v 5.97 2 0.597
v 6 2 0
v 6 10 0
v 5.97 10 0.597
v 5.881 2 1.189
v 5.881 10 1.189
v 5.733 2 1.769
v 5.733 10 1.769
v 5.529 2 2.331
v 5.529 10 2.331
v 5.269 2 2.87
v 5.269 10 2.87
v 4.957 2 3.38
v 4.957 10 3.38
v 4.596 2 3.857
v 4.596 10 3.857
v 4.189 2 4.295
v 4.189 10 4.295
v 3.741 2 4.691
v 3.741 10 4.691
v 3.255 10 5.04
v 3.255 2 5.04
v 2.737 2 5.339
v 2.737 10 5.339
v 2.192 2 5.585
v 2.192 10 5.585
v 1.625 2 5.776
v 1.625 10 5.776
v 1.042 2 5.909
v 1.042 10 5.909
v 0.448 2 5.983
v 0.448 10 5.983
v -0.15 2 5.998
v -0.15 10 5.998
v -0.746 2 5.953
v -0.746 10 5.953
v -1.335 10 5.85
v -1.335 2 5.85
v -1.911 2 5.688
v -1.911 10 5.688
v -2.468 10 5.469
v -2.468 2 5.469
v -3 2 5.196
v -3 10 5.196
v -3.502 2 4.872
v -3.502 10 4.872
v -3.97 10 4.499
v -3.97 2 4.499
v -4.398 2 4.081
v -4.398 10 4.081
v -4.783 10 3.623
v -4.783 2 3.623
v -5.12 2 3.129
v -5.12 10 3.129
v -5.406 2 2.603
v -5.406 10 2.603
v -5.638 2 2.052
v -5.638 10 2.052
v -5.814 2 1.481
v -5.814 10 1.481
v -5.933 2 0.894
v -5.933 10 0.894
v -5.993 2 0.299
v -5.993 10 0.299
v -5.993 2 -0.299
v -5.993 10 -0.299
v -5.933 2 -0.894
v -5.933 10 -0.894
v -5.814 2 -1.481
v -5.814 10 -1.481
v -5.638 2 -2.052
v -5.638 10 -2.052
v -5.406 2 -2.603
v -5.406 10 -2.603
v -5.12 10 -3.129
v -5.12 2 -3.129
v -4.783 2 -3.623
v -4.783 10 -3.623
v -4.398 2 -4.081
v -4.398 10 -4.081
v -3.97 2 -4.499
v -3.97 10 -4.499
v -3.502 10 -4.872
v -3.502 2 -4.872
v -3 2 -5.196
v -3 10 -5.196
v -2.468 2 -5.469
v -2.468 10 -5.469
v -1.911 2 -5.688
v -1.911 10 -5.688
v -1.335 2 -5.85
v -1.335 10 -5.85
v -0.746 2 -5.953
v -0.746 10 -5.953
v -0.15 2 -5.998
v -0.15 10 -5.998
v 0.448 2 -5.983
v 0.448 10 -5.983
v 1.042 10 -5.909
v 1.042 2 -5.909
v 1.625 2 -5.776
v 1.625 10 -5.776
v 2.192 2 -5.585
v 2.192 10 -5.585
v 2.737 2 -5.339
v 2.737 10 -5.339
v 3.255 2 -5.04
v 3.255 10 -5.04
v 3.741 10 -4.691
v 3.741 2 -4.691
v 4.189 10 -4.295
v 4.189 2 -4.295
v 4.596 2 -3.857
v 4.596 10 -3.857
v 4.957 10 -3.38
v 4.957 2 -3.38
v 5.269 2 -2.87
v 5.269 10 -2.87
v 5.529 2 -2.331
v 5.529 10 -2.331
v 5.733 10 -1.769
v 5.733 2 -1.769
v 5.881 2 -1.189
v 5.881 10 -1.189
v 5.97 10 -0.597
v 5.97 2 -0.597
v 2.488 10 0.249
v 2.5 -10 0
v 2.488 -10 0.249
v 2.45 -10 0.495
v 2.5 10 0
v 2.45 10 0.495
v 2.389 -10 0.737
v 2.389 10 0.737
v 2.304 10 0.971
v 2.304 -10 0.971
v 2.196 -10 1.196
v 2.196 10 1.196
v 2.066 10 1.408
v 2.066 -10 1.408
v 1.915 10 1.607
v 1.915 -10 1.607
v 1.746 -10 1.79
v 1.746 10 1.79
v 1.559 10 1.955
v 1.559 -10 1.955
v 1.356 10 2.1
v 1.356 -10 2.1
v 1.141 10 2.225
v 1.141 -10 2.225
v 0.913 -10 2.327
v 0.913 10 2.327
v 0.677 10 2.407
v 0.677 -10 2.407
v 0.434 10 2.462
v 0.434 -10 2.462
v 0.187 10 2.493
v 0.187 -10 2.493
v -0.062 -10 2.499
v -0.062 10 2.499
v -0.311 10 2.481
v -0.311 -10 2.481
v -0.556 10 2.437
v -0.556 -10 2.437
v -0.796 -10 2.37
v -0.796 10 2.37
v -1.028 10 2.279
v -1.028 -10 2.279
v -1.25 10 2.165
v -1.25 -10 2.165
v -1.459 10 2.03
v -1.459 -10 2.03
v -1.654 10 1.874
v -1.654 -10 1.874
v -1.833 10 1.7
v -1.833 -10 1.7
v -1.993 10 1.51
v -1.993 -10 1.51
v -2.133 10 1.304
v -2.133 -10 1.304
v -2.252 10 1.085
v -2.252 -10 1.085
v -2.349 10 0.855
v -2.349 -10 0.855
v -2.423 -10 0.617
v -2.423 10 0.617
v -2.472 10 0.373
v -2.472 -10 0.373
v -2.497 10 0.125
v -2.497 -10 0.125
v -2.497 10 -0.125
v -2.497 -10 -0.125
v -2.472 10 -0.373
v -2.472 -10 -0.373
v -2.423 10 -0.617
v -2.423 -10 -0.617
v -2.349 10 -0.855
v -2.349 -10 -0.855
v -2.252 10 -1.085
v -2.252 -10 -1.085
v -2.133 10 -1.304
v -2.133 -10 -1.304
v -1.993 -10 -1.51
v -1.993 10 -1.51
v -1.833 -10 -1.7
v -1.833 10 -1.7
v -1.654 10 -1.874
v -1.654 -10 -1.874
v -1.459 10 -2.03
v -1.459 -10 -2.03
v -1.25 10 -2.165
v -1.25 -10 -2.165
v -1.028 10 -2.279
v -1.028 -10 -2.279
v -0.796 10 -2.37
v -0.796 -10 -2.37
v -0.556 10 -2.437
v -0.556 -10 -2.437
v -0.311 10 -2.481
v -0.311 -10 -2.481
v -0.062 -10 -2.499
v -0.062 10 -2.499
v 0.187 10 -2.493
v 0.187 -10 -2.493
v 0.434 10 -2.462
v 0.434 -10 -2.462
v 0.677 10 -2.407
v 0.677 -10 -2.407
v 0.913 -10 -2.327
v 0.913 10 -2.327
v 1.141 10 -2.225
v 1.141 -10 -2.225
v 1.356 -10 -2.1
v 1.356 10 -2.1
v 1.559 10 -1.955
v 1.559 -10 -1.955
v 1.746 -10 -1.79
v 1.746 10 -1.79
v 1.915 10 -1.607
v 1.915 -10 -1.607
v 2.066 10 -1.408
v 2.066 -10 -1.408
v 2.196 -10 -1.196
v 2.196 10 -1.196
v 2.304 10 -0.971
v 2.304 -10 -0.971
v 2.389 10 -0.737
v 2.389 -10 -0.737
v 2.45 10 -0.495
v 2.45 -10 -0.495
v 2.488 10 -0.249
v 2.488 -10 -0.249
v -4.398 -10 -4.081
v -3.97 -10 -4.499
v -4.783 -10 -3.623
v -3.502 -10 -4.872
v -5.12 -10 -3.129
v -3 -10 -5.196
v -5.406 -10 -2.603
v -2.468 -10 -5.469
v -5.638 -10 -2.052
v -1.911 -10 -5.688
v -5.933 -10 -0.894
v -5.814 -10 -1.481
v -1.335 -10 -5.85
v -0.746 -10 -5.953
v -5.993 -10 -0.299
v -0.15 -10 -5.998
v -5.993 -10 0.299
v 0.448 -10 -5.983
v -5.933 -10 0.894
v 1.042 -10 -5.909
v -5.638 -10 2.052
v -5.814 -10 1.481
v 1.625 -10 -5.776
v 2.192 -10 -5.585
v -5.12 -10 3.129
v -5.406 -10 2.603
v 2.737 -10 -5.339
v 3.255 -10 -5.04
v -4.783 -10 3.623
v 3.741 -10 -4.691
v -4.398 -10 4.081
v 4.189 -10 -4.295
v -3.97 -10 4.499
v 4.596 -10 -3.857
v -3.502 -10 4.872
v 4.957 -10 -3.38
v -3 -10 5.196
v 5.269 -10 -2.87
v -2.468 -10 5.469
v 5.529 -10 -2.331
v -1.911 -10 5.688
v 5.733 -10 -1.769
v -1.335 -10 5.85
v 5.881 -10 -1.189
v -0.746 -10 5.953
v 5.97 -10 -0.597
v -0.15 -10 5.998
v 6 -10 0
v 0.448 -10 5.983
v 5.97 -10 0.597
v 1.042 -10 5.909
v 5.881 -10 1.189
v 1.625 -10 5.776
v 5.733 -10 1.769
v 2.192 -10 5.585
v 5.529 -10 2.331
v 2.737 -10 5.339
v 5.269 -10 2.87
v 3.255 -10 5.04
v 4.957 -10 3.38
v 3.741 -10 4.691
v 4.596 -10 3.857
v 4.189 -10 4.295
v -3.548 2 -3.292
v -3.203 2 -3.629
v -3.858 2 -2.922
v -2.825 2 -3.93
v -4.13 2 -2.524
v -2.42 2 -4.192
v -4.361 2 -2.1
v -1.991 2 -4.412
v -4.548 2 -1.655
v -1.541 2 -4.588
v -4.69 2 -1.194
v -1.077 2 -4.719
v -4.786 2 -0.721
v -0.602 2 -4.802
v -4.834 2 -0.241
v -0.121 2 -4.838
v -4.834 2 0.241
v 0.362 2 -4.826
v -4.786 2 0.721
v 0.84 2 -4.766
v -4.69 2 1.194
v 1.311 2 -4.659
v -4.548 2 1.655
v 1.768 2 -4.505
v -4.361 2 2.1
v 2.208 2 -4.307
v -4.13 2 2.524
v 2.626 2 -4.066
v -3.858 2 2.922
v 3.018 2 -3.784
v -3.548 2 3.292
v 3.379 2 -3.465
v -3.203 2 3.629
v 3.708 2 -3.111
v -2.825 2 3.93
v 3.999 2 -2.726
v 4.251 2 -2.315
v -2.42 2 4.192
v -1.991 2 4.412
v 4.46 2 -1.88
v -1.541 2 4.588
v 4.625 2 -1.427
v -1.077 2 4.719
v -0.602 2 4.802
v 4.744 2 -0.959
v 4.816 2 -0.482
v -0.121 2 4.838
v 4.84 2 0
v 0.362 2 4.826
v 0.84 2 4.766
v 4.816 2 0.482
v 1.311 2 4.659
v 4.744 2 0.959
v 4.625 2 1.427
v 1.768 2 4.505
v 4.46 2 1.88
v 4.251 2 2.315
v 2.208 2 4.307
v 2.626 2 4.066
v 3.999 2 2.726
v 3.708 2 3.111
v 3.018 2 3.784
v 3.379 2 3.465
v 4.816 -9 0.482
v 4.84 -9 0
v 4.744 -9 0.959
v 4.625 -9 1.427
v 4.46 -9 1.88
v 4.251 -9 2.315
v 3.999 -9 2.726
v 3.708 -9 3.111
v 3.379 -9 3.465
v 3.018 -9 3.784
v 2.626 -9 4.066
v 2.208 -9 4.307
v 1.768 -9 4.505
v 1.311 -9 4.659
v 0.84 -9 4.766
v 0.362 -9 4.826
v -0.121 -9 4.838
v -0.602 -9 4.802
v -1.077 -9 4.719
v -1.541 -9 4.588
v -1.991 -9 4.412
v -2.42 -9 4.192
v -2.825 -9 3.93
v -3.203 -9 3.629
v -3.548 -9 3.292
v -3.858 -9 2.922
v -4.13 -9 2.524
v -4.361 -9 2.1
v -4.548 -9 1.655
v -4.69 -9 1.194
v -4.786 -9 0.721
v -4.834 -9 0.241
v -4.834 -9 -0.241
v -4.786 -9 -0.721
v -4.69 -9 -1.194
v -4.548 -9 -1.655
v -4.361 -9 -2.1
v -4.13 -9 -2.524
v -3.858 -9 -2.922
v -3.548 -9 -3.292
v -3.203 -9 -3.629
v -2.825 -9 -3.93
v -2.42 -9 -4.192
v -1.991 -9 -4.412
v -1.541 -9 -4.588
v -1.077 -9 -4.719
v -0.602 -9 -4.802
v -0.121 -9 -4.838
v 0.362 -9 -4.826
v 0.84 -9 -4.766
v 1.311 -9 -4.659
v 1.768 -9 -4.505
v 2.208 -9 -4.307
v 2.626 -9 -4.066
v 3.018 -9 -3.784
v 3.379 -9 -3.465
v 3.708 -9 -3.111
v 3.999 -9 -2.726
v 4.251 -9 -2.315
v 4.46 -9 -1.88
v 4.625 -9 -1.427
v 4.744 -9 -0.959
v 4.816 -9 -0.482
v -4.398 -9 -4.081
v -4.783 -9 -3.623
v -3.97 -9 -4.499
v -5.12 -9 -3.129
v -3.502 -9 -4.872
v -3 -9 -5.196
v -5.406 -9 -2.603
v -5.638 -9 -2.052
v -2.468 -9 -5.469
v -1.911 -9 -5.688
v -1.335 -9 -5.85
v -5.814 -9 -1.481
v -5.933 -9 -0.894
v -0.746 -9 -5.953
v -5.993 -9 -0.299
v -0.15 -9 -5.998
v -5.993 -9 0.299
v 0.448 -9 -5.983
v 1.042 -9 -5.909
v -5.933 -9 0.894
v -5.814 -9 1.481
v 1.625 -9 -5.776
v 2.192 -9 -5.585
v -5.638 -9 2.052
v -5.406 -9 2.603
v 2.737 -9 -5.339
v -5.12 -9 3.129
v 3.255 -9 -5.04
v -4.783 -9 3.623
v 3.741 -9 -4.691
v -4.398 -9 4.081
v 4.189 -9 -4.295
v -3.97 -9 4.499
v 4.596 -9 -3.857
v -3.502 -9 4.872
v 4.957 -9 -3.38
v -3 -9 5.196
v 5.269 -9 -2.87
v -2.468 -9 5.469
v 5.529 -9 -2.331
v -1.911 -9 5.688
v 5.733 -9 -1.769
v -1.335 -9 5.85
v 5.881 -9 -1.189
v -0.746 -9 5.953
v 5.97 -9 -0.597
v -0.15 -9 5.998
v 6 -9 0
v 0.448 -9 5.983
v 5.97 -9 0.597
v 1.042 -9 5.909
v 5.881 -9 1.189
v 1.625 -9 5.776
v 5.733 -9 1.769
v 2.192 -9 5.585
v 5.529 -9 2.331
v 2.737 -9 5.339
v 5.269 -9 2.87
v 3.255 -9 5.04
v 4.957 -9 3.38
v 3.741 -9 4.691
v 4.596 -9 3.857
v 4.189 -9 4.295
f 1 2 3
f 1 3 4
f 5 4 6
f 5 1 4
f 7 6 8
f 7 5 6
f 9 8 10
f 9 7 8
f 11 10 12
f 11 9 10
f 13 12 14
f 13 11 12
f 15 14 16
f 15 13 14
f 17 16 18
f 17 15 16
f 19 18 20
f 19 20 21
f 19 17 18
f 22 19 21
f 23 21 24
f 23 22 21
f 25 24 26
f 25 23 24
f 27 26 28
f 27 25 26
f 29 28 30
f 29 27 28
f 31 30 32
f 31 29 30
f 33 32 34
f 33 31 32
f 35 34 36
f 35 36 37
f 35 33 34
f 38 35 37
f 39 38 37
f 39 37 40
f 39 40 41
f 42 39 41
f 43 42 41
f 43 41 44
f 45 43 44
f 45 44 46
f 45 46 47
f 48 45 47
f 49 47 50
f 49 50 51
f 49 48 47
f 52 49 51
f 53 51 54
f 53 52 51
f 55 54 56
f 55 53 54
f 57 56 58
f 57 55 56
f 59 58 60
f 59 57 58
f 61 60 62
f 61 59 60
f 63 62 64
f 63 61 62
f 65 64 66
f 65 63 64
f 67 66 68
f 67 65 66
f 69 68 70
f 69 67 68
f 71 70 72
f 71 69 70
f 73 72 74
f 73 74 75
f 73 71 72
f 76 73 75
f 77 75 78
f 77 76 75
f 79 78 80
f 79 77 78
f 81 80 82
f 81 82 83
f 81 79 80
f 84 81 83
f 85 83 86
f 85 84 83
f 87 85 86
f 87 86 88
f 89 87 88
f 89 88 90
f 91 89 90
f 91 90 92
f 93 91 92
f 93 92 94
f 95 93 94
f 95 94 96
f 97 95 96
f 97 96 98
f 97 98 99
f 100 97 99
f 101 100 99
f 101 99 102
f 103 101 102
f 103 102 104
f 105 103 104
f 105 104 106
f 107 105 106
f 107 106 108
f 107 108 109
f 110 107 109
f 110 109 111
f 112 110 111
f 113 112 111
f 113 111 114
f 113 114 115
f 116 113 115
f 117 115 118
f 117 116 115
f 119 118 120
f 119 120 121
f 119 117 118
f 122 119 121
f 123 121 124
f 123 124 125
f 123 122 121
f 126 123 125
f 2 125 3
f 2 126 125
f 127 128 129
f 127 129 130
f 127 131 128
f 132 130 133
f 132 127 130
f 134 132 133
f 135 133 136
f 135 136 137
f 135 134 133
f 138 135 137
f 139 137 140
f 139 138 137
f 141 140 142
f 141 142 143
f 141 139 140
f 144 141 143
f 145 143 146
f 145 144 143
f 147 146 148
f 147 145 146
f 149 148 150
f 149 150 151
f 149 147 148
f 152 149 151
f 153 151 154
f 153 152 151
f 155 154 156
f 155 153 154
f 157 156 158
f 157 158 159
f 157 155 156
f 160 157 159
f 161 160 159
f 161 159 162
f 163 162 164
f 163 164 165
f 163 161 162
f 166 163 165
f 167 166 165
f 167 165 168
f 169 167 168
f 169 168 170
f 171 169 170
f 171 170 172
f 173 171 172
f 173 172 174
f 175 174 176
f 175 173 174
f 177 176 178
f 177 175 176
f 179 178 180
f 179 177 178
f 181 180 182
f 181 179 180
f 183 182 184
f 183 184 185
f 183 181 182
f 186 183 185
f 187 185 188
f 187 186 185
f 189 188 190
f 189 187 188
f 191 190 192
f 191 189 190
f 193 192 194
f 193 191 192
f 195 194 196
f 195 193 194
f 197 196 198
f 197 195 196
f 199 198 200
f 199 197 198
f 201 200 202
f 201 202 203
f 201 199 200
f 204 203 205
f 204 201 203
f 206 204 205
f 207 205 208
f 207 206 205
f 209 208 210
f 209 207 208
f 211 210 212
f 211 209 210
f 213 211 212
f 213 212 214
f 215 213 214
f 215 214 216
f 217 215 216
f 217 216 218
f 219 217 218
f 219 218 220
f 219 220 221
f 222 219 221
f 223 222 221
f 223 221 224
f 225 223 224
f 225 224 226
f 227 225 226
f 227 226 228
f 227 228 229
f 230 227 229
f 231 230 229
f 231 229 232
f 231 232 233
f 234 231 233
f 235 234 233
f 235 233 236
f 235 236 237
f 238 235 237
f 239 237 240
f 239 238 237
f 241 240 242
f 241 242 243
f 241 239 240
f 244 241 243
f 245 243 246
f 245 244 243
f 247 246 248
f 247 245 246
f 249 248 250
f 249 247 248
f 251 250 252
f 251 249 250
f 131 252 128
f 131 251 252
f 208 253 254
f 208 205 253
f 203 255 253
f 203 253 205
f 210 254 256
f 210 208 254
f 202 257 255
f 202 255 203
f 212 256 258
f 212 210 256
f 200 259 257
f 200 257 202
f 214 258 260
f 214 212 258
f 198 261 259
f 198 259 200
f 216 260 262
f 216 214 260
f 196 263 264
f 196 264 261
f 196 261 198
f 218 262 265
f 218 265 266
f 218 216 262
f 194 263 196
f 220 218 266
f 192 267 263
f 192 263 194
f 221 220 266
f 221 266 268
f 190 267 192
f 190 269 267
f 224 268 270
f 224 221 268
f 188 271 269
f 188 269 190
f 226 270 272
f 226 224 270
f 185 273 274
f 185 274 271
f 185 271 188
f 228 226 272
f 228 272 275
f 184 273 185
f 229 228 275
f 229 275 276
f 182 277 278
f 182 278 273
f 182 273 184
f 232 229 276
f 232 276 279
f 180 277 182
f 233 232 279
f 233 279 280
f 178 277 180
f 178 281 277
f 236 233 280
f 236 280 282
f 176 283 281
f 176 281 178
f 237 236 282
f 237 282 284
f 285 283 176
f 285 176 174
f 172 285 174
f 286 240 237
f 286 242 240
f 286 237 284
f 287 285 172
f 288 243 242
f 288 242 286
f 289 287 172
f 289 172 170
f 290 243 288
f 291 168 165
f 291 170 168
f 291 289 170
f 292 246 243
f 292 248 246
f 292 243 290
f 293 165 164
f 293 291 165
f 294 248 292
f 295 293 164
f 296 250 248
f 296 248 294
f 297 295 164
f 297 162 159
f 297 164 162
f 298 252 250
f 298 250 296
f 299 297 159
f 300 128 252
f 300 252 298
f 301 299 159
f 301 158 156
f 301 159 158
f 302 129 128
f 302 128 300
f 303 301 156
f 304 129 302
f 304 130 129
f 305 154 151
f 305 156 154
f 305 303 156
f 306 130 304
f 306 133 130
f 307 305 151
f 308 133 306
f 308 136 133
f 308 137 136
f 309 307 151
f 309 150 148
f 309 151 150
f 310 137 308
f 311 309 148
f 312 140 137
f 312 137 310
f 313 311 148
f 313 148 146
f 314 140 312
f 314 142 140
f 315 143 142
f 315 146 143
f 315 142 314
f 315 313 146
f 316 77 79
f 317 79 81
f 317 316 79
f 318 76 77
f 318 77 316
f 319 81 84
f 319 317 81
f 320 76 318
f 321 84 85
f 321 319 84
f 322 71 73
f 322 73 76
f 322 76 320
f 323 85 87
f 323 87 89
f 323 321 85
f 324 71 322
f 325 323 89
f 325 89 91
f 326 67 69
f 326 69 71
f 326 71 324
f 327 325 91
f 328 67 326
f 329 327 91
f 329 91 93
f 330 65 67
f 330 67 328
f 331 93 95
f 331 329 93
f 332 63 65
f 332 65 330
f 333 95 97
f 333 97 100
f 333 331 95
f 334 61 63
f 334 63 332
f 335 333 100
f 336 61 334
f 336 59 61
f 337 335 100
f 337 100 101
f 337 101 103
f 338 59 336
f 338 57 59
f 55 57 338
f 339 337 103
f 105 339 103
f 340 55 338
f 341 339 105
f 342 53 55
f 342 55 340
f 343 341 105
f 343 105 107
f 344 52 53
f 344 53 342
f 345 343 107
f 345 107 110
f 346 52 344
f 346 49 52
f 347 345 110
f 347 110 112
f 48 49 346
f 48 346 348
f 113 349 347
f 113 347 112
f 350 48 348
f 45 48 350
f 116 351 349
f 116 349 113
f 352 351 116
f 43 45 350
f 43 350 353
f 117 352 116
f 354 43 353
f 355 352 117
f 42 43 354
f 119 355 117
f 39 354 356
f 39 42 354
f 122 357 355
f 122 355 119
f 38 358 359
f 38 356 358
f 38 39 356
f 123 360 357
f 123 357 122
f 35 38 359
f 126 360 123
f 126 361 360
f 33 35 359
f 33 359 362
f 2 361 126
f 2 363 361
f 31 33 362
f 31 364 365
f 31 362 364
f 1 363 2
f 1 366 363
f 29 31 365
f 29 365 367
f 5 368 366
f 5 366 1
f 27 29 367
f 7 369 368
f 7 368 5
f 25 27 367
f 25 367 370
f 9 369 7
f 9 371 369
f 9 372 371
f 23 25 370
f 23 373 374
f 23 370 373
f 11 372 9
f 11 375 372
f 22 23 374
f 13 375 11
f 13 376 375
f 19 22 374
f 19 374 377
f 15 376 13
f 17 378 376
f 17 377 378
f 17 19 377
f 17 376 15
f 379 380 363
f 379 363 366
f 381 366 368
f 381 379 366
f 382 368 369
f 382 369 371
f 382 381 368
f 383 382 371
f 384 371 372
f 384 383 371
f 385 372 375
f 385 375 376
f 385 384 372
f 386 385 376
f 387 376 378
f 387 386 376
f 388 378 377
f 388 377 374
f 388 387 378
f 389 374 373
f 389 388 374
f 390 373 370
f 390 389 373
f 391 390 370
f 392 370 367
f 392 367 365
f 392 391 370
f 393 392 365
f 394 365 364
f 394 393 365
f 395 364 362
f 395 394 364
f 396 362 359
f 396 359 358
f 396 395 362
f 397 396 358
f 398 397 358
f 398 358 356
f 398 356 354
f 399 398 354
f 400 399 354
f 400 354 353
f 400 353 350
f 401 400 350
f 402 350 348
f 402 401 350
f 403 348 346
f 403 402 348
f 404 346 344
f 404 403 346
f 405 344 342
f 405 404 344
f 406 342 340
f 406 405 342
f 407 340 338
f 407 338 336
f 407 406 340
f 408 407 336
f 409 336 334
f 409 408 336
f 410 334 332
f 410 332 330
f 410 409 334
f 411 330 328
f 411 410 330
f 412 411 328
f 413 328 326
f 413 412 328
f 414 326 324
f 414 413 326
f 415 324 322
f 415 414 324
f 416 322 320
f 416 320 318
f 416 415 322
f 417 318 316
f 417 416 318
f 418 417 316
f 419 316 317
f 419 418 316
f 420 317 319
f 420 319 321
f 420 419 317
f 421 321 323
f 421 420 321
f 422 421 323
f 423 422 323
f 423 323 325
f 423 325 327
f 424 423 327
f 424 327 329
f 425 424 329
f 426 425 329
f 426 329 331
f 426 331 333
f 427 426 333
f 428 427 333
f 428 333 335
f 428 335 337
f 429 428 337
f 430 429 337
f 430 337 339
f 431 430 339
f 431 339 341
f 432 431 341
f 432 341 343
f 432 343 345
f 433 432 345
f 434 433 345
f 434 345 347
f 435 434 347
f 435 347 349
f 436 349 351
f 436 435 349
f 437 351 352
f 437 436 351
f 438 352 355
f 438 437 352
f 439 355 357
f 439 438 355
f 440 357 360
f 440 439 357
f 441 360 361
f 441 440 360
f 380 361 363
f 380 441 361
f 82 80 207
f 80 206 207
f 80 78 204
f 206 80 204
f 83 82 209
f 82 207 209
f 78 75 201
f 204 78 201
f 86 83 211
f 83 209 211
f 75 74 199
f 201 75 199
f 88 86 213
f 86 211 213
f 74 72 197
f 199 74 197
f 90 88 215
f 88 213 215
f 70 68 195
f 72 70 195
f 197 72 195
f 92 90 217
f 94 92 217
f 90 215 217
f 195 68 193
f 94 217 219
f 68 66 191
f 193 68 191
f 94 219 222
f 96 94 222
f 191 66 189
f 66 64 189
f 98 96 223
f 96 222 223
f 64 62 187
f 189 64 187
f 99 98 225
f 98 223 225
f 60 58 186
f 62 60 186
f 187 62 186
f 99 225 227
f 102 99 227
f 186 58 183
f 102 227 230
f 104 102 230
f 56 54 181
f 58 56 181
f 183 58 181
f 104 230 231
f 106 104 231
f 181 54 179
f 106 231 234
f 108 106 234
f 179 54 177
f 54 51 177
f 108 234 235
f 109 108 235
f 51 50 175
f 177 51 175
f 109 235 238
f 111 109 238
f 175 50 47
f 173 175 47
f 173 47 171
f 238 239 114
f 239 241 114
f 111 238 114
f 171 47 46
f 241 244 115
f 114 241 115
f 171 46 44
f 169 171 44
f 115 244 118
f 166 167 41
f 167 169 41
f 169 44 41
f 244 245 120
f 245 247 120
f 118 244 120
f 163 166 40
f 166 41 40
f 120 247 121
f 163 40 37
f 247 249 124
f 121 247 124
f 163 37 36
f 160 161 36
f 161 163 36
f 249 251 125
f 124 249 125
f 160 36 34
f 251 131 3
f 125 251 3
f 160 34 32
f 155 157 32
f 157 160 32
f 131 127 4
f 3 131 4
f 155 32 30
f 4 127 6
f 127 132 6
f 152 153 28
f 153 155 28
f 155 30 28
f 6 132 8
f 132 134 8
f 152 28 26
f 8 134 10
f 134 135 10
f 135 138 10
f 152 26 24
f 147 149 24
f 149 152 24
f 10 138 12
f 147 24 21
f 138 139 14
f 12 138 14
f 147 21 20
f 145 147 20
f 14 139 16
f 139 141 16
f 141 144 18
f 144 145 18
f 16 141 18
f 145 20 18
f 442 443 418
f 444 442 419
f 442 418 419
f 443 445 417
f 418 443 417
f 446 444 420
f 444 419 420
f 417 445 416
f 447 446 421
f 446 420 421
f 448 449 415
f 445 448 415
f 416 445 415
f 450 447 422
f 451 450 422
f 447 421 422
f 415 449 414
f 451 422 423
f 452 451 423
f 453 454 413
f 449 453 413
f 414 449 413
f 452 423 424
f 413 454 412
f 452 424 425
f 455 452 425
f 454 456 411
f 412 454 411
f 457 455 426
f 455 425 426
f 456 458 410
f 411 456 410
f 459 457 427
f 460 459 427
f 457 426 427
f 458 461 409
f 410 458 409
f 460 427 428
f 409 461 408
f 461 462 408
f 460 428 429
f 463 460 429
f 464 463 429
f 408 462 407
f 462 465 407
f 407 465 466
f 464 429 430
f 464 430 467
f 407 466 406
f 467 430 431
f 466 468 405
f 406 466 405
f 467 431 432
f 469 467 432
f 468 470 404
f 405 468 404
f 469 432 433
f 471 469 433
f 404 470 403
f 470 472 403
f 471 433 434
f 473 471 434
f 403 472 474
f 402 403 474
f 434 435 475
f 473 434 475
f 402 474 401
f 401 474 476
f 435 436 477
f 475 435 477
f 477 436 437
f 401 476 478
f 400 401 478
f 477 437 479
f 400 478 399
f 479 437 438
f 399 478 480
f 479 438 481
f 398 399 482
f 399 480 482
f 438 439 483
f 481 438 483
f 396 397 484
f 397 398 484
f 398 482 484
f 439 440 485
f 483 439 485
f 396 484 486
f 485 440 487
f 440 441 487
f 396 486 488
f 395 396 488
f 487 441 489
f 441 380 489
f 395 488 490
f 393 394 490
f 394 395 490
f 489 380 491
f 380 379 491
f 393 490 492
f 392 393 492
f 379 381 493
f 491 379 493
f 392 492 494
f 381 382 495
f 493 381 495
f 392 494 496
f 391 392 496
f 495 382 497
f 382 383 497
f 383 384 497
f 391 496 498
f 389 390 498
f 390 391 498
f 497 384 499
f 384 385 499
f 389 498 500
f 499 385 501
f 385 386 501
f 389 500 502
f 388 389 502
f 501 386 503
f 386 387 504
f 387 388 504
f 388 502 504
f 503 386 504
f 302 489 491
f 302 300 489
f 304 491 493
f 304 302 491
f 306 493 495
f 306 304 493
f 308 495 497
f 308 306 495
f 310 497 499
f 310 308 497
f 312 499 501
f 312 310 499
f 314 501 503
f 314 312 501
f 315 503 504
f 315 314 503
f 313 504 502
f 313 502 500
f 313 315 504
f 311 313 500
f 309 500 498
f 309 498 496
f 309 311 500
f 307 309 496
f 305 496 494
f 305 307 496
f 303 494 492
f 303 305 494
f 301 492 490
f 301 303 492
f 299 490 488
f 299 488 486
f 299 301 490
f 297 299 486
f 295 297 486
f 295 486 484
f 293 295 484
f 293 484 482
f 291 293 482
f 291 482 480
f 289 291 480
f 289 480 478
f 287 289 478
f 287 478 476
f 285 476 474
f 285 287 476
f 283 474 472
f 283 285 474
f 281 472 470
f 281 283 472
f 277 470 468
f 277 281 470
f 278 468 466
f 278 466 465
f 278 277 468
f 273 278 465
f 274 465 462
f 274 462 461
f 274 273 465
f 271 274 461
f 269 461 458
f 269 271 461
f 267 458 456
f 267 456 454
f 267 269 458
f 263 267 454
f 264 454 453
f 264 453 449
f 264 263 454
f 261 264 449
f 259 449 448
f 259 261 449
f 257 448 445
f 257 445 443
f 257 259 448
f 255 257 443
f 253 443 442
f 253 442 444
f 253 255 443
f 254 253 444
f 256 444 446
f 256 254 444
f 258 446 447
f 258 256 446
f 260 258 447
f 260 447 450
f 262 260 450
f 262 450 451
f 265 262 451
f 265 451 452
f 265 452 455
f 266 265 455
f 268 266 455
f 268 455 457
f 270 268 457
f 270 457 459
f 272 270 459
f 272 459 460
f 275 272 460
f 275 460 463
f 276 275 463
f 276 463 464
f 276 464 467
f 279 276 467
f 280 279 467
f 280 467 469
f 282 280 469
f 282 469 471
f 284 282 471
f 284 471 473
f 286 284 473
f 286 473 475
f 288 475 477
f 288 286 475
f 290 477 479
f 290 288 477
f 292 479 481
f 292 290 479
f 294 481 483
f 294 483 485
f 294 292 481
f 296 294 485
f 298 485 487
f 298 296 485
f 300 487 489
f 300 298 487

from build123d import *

# Parameters (mm, degrees)
F0_R     = 6
F0_R_2   = 2.5
F1_DEPTH = 10
F3_R     = 7
F3_R_2   = 4.84
F4_DEPTH = 11


with BuildPart() as f1:
    # F0 (on Front) → F1 (new body, symmetric)
    with BuildSketch(Plane.XZ):
        Circle(F0_R)
        Circle(F0_R_2, mode=Mode.SUBTRACT)
    extrude(amount=F1_DEPTH, both=True)

    # F3 (on offset) → F4 (cut)
    with BuildSketch(Plane.XZ.offset(9)):
        Circle(F3_R)
        Circle(F3_R_2, mode=Mode.SUBTRACT)
    extrude(amount=-F4_DEPTH, mode=Mode.SUBTRACT)


solid = f1.part
